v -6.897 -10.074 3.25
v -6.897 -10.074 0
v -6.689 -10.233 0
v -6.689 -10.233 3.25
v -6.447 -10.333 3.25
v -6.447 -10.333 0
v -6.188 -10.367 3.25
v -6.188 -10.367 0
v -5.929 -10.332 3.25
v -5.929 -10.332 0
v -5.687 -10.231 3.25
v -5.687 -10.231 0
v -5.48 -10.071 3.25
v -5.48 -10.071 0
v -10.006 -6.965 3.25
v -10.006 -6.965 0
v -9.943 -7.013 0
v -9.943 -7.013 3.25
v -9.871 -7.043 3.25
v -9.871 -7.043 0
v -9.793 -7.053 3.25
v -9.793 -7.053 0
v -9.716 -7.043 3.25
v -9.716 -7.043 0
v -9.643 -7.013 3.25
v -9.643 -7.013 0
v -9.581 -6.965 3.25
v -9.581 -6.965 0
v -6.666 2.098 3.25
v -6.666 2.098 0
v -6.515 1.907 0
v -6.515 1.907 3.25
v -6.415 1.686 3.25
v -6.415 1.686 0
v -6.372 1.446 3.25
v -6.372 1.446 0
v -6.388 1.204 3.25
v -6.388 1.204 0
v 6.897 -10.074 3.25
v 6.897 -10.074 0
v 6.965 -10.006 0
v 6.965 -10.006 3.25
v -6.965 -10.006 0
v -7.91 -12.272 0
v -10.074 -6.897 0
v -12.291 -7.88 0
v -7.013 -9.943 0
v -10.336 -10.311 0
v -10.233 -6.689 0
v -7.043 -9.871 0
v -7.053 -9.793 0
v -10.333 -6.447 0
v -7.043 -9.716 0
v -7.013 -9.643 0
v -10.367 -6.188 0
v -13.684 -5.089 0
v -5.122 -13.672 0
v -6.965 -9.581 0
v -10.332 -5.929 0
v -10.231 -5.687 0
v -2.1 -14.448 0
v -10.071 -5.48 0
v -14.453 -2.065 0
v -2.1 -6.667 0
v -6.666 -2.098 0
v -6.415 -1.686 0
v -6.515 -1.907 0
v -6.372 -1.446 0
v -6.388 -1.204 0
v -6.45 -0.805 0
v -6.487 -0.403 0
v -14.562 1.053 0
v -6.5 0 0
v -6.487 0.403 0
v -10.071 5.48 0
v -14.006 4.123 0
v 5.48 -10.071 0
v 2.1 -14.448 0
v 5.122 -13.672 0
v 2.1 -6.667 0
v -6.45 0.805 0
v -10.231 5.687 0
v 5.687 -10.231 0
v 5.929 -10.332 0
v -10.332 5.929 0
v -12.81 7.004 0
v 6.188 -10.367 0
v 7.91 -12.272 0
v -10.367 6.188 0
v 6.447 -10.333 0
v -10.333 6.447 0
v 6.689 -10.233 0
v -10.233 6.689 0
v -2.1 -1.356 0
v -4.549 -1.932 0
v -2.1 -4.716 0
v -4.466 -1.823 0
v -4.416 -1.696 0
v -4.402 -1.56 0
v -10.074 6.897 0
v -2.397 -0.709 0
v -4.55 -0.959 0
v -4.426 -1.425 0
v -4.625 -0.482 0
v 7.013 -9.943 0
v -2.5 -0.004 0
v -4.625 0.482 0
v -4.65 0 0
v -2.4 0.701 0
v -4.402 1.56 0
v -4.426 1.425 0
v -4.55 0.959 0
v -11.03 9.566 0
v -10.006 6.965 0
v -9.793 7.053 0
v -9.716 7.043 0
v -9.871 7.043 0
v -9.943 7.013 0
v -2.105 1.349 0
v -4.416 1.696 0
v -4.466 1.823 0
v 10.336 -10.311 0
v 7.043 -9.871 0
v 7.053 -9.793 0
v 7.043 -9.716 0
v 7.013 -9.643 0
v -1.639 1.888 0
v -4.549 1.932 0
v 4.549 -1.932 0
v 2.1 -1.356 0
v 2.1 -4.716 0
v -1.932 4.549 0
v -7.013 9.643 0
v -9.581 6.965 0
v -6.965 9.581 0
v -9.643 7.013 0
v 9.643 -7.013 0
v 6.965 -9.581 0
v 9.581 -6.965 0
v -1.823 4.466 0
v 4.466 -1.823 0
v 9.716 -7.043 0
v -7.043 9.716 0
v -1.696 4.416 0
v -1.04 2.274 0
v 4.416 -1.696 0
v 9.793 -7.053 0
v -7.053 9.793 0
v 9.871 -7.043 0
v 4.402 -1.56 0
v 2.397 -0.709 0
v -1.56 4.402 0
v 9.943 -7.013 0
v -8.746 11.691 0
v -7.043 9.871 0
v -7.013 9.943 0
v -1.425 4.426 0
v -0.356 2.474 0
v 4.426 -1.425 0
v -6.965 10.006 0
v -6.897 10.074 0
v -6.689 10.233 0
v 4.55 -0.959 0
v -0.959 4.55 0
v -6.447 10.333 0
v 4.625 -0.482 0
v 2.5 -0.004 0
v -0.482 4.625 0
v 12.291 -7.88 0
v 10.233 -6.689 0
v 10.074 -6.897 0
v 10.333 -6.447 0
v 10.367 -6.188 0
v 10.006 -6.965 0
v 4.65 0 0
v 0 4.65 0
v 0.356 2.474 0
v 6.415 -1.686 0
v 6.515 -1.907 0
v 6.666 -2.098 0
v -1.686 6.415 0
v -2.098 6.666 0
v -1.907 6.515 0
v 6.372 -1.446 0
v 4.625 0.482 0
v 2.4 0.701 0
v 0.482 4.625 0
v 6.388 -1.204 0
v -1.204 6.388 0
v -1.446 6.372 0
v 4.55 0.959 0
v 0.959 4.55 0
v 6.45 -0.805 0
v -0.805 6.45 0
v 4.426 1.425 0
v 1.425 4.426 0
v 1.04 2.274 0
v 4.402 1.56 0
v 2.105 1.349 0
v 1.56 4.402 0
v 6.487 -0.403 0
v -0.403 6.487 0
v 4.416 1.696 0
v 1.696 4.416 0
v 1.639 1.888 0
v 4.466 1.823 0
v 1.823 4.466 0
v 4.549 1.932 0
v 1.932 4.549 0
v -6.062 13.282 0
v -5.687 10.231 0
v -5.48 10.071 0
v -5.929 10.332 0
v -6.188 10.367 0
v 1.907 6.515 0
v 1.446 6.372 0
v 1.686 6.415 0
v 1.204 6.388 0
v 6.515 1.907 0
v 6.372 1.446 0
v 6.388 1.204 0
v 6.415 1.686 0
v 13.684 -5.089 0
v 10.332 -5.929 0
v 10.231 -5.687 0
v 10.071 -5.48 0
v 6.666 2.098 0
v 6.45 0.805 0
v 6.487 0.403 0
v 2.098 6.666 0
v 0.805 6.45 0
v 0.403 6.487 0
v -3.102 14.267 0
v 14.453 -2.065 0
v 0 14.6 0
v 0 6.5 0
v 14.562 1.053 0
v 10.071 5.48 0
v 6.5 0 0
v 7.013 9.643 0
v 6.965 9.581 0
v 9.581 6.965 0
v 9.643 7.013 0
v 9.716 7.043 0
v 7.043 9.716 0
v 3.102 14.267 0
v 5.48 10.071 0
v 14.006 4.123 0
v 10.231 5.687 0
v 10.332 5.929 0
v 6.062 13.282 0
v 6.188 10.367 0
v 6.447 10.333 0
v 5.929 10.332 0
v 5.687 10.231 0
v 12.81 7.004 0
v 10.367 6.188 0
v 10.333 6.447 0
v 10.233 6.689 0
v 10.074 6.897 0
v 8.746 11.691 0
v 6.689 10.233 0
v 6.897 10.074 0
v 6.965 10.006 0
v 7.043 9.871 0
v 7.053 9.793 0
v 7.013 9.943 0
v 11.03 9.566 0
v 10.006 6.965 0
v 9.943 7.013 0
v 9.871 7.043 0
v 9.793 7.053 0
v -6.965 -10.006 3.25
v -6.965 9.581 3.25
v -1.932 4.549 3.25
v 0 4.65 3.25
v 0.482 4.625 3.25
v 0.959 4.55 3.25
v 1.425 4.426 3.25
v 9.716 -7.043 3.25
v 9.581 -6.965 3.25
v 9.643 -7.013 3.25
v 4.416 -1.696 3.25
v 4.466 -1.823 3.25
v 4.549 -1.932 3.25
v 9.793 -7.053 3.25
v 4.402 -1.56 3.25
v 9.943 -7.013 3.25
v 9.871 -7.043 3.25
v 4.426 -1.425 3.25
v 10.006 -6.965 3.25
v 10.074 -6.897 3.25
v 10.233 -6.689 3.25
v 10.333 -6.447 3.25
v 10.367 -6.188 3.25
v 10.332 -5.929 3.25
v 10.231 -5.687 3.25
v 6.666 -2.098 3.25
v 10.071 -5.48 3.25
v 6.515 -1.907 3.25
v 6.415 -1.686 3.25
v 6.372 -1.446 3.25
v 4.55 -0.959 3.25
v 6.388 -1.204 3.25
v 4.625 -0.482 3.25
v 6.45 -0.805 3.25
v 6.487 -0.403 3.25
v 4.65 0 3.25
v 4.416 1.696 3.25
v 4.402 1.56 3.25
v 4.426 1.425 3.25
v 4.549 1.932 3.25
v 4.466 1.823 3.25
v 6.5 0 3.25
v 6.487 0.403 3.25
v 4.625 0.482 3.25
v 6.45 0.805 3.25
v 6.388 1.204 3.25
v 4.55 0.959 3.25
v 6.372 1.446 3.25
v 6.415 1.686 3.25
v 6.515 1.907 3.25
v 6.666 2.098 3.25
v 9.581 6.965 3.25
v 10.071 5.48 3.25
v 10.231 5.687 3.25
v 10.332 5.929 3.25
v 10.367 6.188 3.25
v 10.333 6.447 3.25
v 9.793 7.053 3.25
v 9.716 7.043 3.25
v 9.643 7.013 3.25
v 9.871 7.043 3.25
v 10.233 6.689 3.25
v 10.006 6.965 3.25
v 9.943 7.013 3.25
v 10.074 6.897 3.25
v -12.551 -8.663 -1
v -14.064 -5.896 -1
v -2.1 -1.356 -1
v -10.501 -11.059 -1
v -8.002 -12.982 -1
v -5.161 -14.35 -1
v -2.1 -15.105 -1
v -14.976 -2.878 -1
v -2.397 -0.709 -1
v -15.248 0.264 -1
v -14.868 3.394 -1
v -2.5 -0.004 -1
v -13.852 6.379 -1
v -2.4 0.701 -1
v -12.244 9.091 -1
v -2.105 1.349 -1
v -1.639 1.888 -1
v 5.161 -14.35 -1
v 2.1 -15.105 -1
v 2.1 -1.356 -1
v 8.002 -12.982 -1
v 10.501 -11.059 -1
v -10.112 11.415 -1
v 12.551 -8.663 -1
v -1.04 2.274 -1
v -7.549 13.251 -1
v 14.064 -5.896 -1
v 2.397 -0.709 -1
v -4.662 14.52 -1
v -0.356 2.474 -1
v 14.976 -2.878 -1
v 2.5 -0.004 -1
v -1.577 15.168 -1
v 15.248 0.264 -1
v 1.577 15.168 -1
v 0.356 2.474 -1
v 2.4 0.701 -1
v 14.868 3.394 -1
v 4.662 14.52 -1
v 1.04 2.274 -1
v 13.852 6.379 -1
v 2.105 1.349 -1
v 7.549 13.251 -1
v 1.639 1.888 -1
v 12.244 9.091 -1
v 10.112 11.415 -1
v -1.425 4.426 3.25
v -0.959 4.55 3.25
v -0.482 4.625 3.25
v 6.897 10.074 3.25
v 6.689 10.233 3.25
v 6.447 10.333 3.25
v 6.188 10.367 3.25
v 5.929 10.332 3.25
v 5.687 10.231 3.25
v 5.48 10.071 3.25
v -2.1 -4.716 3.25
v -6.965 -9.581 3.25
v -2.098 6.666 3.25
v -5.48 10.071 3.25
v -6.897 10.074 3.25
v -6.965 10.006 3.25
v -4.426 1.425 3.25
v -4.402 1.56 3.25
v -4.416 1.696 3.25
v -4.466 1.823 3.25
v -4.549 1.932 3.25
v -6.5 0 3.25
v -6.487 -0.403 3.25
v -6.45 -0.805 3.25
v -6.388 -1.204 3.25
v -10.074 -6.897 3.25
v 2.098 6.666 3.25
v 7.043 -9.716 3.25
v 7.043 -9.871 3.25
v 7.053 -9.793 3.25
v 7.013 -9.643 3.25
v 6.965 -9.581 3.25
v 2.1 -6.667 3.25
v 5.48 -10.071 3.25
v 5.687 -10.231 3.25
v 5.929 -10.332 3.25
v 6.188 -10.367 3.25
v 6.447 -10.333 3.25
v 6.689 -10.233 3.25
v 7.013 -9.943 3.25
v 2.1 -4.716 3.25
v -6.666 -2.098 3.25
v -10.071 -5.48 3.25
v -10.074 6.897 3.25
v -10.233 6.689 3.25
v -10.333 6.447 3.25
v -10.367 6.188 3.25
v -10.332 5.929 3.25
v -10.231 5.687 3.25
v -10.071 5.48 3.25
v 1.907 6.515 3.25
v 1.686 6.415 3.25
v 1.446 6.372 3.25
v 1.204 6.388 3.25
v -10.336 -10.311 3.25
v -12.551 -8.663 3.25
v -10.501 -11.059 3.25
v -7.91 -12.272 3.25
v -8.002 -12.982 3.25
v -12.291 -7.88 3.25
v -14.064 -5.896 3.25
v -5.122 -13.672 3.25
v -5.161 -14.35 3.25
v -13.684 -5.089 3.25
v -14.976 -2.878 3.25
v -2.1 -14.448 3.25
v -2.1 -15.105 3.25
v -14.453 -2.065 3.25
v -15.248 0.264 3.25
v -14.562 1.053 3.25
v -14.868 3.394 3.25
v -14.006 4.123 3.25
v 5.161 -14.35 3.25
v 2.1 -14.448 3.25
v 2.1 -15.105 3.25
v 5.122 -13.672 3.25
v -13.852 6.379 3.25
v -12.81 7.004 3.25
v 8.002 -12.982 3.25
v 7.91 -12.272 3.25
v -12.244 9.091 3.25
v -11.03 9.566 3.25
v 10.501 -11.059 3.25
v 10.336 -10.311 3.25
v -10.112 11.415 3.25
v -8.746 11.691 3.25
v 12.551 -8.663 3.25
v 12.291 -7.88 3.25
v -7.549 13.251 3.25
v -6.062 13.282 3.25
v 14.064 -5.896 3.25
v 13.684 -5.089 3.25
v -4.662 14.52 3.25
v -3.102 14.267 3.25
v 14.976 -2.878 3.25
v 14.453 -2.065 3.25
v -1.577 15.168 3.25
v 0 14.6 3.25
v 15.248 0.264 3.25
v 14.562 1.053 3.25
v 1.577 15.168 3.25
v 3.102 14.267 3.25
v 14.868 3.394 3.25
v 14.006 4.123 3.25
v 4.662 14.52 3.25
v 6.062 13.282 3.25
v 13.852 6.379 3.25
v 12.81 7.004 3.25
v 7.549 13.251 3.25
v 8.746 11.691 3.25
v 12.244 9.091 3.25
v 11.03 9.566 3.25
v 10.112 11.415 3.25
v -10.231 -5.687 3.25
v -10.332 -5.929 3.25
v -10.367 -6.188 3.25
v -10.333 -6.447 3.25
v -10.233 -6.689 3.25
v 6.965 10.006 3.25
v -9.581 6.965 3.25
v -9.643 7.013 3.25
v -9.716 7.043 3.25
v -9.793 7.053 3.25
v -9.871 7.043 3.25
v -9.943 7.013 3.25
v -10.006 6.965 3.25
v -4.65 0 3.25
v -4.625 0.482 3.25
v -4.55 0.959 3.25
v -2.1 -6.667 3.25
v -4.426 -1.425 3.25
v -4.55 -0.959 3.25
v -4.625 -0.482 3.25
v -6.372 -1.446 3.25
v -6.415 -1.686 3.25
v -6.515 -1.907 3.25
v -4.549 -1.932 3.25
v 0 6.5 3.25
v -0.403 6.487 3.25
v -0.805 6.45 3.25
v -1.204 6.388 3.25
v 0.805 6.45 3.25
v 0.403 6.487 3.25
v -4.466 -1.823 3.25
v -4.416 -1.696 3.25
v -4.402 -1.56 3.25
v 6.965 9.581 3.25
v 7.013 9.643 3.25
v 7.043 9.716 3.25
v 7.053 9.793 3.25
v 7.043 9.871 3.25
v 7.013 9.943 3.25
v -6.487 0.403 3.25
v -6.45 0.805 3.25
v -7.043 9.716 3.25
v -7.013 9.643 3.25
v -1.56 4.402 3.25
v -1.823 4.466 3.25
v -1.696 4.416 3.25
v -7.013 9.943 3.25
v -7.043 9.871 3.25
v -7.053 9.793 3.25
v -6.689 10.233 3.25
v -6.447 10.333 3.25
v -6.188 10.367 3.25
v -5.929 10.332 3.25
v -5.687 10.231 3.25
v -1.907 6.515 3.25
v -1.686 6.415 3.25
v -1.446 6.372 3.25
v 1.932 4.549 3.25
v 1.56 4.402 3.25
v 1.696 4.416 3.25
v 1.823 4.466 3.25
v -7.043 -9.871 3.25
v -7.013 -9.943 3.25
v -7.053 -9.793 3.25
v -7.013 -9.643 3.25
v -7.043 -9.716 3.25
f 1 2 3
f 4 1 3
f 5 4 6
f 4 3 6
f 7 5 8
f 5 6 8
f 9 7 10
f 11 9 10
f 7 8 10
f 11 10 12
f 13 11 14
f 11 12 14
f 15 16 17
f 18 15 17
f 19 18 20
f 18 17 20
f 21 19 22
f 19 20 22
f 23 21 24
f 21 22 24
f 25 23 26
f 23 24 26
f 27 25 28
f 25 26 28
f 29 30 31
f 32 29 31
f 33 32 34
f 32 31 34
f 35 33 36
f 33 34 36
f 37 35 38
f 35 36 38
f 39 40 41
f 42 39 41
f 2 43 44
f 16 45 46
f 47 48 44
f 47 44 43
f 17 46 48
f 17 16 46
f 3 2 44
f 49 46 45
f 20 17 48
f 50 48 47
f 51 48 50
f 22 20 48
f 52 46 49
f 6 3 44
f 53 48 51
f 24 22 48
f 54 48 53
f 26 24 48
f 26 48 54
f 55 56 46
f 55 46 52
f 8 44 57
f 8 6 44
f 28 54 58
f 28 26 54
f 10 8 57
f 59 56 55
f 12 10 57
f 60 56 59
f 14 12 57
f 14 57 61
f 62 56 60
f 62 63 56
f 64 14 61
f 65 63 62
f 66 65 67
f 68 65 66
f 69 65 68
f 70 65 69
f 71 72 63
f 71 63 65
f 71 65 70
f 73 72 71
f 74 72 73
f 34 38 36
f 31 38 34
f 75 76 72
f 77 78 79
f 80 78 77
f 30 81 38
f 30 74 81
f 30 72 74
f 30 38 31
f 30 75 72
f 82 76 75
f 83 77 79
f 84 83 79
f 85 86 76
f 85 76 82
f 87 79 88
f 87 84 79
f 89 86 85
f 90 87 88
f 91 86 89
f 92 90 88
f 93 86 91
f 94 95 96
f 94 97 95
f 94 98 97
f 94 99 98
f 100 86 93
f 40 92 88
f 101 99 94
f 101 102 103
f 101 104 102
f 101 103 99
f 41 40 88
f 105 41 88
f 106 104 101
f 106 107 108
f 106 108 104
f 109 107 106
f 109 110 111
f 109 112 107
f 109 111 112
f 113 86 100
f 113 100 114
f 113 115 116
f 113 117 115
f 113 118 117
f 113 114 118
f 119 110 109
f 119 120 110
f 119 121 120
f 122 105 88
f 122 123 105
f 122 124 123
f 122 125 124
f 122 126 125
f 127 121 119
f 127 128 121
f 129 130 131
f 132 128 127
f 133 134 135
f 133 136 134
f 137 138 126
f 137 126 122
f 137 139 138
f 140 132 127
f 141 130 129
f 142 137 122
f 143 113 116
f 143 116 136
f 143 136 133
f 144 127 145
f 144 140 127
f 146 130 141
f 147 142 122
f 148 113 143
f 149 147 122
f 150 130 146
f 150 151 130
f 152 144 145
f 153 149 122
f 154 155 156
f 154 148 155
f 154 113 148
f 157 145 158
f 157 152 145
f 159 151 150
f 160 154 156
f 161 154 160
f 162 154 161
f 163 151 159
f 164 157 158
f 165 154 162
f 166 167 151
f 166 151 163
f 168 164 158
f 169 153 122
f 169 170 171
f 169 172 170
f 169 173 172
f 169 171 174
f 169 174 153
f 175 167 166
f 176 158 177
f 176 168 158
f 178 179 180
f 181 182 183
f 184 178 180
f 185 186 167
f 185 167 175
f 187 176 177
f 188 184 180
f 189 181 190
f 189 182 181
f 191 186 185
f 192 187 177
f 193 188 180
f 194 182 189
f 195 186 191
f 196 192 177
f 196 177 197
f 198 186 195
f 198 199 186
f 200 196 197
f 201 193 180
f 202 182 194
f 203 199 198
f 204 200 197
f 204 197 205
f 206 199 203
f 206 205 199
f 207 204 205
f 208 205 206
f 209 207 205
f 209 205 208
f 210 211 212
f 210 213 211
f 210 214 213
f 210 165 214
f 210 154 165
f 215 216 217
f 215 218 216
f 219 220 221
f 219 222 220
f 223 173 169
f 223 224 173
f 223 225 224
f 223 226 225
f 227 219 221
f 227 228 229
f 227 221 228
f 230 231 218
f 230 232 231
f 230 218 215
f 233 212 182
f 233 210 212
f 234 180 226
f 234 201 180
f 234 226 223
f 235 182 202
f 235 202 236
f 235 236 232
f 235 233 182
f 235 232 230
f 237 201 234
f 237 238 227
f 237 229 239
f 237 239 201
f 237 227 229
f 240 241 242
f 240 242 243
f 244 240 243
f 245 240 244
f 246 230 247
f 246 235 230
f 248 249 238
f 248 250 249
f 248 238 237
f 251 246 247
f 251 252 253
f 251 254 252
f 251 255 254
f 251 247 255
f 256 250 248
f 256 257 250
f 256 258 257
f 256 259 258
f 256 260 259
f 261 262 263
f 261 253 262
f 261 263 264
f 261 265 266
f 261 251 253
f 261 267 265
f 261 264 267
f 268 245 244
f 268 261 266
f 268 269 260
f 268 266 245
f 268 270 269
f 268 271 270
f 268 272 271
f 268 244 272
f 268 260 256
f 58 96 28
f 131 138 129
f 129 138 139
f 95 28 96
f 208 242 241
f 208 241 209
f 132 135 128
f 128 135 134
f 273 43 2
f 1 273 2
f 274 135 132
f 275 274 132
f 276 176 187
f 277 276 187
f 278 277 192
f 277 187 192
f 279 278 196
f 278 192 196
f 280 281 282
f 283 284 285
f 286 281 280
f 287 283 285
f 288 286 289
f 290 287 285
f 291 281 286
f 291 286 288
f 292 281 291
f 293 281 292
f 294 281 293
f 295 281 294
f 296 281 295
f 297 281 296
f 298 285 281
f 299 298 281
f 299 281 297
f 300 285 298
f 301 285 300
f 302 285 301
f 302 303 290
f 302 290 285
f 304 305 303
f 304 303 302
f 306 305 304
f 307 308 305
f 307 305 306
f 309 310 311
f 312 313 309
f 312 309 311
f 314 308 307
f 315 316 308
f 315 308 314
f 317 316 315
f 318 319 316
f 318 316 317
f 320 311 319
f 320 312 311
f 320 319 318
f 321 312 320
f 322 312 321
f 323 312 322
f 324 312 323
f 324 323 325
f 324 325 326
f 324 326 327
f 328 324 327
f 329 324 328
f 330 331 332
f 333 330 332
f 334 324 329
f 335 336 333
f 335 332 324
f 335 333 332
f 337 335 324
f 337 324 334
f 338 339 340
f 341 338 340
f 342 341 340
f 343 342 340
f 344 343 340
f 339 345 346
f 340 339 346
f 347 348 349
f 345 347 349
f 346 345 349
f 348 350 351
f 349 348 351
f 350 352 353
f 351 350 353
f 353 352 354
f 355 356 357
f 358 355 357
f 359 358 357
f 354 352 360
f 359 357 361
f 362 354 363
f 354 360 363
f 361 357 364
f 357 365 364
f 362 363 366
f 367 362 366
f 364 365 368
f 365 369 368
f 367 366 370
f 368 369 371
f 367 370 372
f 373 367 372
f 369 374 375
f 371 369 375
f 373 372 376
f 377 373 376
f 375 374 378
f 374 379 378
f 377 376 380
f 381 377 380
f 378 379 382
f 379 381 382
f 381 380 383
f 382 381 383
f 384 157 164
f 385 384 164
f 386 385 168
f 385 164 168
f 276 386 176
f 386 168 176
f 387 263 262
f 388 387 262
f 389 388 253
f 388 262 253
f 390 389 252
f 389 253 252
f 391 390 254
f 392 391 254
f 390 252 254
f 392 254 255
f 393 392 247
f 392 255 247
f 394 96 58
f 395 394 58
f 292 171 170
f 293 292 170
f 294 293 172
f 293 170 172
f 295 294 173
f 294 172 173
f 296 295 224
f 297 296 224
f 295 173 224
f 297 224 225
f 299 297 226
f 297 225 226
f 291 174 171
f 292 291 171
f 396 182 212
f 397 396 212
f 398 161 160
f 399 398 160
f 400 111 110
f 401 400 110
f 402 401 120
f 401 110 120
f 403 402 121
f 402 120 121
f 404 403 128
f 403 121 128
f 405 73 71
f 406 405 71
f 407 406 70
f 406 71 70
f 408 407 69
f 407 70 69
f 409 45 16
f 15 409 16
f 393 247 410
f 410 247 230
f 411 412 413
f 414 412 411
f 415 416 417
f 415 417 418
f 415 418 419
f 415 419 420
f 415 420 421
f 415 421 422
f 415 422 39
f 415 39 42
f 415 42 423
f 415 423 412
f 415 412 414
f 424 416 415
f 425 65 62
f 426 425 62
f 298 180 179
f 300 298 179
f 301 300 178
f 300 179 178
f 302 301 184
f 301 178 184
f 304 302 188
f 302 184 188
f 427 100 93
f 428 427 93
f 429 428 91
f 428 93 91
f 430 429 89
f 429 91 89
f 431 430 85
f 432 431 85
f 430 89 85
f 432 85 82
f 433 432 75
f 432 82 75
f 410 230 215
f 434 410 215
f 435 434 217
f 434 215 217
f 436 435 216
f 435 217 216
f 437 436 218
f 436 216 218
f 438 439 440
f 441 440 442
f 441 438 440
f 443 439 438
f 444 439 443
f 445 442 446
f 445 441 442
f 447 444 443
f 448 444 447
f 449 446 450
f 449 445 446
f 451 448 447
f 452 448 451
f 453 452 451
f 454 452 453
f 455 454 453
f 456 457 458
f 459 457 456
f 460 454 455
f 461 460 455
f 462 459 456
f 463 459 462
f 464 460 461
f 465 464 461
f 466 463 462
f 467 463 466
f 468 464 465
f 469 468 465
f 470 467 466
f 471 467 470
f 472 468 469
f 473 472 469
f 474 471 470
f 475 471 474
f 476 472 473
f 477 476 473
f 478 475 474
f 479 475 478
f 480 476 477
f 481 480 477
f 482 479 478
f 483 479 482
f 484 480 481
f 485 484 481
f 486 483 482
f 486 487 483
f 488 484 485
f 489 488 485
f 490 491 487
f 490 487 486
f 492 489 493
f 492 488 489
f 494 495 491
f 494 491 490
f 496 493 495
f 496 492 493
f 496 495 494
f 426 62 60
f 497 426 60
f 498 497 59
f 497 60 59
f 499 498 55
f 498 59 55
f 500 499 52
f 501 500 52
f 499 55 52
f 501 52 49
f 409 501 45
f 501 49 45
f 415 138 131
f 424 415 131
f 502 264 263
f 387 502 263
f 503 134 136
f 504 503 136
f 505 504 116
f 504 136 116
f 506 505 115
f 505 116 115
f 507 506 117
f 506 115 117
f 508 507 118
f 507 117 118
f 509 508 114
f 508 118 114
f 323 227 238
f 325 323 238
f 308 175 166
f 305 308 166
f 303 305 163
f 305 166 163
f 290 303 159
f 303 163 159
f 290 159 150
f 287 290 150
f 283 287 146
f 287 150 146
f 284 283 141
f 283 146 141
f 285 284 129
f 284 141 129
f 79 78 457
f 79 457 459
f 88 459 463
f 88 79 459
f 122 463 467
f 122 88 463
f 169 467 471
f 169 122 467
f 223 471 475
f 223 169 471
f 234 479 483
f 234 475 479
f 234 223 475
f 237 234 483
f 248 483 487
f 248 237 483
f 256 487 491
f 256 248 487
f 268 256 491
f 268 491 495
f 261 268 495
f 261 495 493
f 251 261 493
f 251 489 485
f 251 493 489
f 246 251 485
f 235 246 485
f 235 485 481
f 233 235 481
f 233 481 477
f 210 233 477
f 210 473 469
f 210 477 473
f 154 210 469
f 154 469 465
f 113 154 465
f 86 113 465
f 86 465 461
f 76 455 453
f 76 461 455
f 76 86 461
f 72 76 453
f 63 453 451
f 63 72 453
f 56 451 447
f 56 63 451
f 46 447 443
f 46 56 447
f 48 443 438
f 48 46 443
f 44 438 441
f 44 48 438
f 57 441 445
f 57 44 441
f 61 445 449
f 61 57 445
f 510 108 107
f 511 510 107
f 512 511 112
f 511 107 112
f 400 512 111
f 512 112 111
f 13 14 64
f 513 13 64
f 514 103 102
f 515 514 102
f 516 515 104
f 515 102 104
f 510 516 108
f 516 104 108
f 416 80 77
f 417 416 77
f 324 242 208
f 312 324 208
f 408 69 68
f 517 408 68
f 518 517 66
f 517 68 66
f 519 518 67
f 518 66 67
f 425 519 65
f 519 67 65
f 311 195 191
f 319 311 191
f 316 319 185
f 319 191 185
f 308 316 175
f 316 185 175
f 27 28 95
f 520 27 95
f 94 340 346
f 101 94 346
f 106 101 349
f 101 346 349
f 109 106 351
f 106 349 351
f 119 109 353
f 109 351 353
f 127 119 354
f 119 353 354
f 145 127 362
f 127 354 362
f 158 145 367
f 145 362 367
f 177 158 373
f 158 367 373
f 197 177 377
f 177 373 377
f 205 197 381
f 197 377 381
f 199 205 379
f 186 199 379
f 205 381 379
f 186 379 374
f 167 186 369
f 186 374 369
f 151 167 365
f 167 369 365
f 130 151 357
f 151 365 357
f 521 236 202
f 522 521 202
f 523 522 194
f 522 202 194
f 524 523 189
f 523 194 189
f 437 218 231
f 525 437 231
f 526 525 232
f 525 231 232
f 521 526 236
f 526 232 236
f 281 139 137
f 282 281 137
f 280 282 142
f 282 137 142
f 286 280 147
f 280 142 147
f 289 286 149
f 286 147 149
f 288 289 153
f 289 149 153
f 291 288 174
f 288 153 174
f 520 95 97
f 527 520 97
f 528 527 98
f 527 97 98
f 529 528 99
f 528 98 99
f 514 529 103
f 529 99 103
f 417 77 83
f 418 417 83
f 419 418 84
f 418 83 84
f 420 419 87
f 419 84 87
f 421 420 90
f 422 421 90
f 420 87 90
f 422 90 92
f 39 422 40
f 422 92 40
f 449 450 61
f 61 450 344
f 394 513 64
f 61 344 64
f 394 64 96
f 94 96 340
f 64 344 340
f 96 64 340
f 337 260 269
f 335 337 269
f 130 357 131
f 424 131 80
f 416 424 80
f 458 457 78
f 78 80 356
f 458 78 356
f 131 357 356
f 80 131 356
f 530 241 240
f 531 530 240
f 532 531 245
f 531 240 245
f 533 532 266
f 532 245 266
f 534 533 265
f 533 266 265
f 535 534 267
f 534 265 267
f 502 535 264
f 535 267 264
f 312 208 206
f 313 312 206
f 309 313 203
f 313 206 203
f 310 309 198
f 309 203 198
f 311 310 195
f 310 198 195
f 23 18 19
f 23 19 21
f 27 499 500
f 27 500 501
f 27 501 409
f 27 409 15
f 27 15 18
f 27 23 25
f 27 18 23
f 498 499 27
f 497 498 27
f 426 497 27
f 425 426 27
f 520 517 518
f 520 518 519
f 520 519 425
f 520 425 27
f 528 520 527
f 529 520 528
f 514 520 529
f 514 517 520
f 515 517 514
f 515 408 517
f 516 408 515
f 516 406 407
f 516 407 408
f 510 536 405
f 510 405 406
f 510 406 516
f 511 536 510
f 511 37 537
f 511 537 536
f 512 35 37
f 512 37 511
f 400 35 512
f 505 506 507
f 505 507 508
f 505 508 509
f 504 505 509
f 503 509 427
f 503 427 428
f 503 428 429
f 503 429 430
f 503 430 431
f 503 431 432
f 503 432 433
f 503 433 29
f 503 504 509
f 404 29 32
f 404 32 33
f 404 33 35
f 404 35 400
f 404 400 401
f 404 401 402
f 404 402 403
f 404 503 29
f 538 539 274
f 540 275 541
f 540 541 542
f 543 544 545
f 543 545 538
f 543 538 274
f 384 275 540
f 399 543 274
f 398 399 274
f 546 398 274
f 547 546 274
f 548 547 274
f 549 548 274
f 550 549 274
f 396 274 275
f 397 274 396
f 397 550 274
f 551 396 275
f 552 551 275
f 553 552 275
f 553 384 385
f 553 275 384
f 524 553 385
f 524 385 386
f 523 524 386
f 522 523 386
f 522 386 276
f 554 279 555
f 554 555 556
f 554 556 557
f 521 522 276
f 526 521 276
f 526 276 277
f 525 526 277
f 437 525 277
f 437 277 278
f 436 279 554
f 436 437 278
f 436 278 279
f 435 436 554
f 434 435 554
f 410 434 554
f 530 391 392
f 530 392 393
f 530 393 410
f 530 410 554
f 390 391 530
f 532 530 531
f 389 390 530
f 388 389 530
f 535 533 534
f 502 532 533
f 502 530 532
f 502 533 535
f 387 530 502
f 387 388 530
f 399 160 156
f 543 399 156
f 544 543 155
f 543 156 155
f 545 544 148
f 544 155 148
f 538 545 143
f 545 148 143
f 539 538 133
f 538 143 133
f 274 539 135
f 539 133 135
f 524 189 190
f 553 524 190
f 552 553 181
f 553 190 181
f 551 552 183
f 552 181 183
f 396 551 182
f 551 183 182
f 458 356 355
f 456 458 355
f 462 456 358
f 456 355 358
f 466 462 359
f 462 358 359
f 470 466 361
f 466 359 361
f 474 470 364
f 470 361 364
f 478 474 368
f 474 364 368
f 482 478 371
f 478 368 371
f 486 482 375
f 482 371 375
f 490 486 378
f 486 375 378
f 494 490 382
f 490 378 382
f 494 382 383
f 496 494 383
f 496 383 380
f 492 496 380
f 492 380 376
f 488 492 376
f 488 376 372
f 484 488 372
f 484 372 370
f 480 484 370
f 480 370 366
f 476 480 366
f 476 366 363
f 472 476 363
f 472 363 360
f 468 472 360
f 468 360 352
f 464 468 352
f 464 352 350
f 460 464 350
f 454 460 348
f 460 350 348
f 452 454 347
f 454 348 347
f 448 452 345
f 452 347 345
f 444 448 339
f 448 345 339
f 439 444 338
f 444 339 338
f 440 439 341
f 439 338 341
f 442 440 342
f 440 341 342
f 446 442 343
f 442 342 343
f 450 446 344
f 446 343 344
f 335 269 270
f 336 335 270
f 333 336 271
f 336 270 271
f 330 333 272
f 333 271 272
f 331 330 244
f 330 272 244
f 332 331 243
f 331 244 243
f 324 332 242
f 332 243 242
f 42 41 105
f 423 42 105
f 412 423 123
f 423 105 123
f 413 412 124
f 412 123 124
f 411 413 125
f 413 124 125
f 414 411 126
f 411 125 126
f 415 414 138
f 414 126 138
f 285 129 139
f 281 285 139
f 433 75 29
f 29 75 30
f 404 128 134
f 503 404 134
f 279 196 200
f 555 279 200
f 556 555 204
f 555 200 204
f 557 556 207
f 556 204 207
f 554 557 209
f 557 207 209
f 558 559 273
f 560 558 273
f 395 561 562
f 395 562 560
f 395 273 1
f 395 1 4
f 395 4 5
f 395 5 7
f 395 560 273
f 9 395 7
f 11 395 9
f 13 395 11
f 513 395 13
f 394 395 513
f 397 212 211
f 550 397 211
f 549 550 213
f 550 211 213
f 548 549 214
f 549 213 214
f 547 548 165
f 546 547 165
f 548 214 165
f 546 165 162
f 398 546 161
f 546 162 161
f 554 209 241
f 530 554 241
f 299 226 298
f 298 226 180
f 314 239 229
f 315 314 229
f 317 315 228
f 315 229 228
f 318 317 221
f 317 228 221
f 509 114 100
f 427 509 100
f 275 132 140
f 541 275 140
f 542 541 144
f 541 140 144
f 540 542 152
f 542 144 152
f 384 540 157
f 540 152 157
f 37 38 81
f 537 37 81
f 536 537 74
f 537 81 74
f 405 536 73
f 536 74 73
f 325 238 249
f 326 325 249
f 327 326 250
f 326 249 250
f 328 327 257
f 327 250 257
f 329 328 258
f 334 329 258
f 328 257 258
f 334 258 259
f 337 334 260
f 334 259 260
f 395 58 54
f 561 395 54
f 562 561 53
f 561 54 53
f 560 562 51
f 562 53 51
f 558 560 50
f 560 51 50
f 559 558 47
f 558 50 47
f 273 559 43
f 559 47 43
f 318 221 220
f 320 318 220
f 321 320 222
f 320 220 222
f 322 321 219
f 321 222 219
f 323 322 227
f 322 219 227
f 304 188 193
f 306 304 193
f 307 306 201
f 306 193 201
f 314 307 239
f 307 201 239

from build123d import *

# Parameters (mm, degrees)
F0_R     = 15.25
F1_DEPTH = 1
F2_R     = 15.25
F2_R_2   = 14.6
F3_DEPTH = 3.25
F5_DEPTH = 4.251


with BuildPart() as f1:
    # F0 (on Top) → F1 (new body)
    with BuildSketch(Plane.XY):
        Circle(F0_R)
    extrude(amount=-F1_DEPTH)

    # F2 (on Top) → F3 (join)
    with BuildSketch(Plane.XY):
        Circle(F2_R)
        Circle(F2_R_2, mode=Mode.SUBTRACT)
        with BuildLine():
            ThreePointArc((1.4254005383, 4.426142034), (1.6960254298, 4.4160388114), (1.932222804, 4.5485178944))
            Line((1.932222804, 4.5485178944), (6.9650017947, 9.5812968851))
            ThreePointArc((6.9650017947, 9.5812968851), (7.0528697603, 9.7934289194), (6.9650017947, 10.0055609538))
            Line((6.9650017947, 10.0055609538), (6.8967918056, 10.0737709429))
            ThreePointArc((6.8967918056, 10.0737709429), (6.1879198942, 10.3666626039), (5.4800863823, 10.0712702695))
            Line((5.4800863823, 10.0712702695), (2.0984543523, 6.6656774564))
            ThreePointArc((2.0984543523, 6.6656774564), (1.6856522801, 6.4153428351), (1.2036749488, 6.3875790889))
            ThreePointArc((1.2036749488, 6.3875790889), (0.6044567486, 6.4718337462), (0, 6.5))
            ThreePointArc((0, 6.5), (-0.6044567486, 6.4718337462), (-1.2036749488, 6.3875790889))
            ThreePointArc((-1.2036749488, 6.3875790889), (-1.6856522801, 6.4153428351), (-2.0984543523, 6.6656774564))
            Line((-2.0984543523, 6.6656774564), (-5.4800863823, 10.0712702695))
            ThreePointArc((-5.4800863823, 10.0712702695), (-6.1879198942, 10.3666626039), (-6.8967918056, 10.0737709429))
            Line((-6.8967918056, 10.0737709429), (-6.9650017947, 10.0055609538))
            ThreePointArc((-6.9650017947, 10.0055609538), (-7.0528697603, 9.7934289194), (-6.9650017947, 9.5812968851))
            Line((-6.9650017947, 9.5812968851), (-1.932222804, 4.5485178944))
            ThreePointArc((-1.932222804, 4.5485178944), (-1.6960254298, 4.4160388114), (-1.4254005383, 4.426142034))
            ThreePointArc((-1.4254005383, 4.426142034), (-0.7214359091, 4.5936946164), (0, 4.65))
            ThreePointArc((0, 4.65), (0.7214359091, 4.5936946164), (1.4254005383, 4.426142034))
        make_face()
        with BuildLine():
            Line((10.0737709429, 6.8967918056), (10.0055609538, 6.9650017947))
            ThreePointArc((10.0055609538, 6.9650017947), (9.7934289194, 7.0528697603), (9.5812968851, 6.9650017947))
            Line((9.5812968851, 6.9650017947), (4.5485178944, 1.932222804))
            ThreePointArc((4.5485178944, 1.932222804), (4.4160388114, 1.6960254298), (4.426142034, 1.4254005383))
            ThreePointArc((4.426142034, 1.4254005383), (4.5936946164, 0.7214359091), (4.65, 0))
            ThreePointArc((4.65, 0), (4.5936946164, -0.7214359091), (4.426142034, -1.4254005383))
            ThreePointArc((4.426142034, -1.4254005383), (4.4160388114, -1.6960254298), (4.5485178944, -1.932222804))
            Line((4.5485178944, -1.932222804), (9.5812968851, -6.9650017947))
            ThreePointArc((9.5812968851, -6.9650017947), (9.7934289194, -7.0528697603), (10.0055609538, -6.9650017947))
            Line((10.0055609538, -6.9650017947), (10.0737709429, -6.8967918056))
            ThreePointArc((10.0737709429, -6.8967918056), (10.3666626039, -6.1879198942), (10.0712702695, -5.4800863823))
            Line((10.0712702695, -5.4800863823), (6.6656774564, -2.0984543523))
            ThreePointArc((6.6656774564, -2.0984543523), (6.4153428351, -1.6856522801), (6.3875790889, -1.2036749488))
            ThreePointArc((6.3875790889, -1.2036749488), (6.4718337462, -0.6044567486), (6.5, 0))
            ThreePointArc((6.5, 0), (6.4718337462, 0.6044567486), (6.3875790889, 1.2036749488))
            ThreePointArc((6.3875790889, 1.2036749488), (6.4153428351, 1.6856522801), (6.6656774564, 2.0984543523))
            Line((6.6656774564, 2.0984543523), (10.0712702695, 5.4800863823))
            ThreePointArc((10.0712702695, 5.4800863823), (10.3666626039, 6.1879198942), (10.0737709429, 6.8967918056))
        make_face()
        with BuildLine():
            ThreePointArc((-9.5812968851, 6.9650017947), (-9.7934289194, 7.0528697603), (-10.0055609538, 6.9650017947))
            Line((-10.0055609538, 6.9650017947), (-10.0737709429, 6.8967918056))
            ThreePointArc((-10.0737709429, 6.8967918056), (-10.3666626039, 6.1879198942), (-10.0712702695, 5.4800863823))
            Line((-10.0712702695, 5.4800863823), (-6.6656774564, 2.0984543523))
            ThreePointArc((-6.6656774564, 2.0984543523), (-6.4153428351, 1.6856522801), (-6.3875790889, 1.2036749488))
            ThreePointArc((-6.3875790889, 1.2036749488), (-6.4718337462, 0.6044567486), (-6.5, 0))
            ThreePointArc((-6.5, 0), (-6.4718337462, -0.6044567486), (-6.3875790889, -1.2036749488))
            ThreePointArc((-6.3875790889, -1.2036749488), (-6.4153428351, -1.6856522801), (-6.6656774564, -2.0984543523))
            Line((-6.6656774564, -2.0984543523), (-10.0712702695, -5.4800863823))
            ThreePointArc((-10.0712702695, -5.4800863823), (-10.3666626039, -6.1879198942), (-10.0737709429, -6.8967918056))
            Line((-10.0737709429, -6.8967918056), (-10.0055609538, -6.9650017947))
            ThreePointArc((-10.0055609538, -6.9650017947), (-9.7934289194, -7.0528697603), (-9.5812968851, -6.9650017947))
            Line((-9.5812968851, -6.9650017947), (-4.5485178944, -1.932222804))
            ThreePointArc((-4.5485178944, -1.932222804), (-4.4160388114, -1.6960254298), (-4.426142034, -1.4254005383))
            ThreePointArc((-4.426142034, -1.4254005383), (-4.5936946164, -0.7214359091), (-4.65, 0))
            ThreePointArc((-4.65, 0), (-4.5936946164, 0.7214359091), (-4.426142034, 1.4254005383))
            ThreePointArc((-4.426142034, 1.4254005383), (-4.4160388114, 1.6960254298), (-4.5485178944, 1.932222804))
            Line((-4.5485178944, 1.932222804), (-9.5812968851, 6.9650017947))
        make_face()
        with BuildLine():
            ThreePointArc((-6.9650017947, -9.5812968851), (-7.0528697603, -9.7934289194), (-6.9650017947, -10.0055609538))
            Line((-6.9650017947, -10.0055609538), (-6.8967918056, -10.0737709429))
            ThreePointArc((-6.8967918056, -10.0737709429), (-6.1879198942, -10.3666626039), (-5.4800863823, -10.0712702695))
            Line((-5.4800863823, -10.0712702695), (-2.0984543523, -6.6656774564))
            ThreePointArc((-2.0984543523, -6.6656774564), (-1.6856522801, -6.4153428351), (-1.2036749488, -6.3875790889))
            ThreePointArc((-1.2036749488, -6.3875790889), (-0.6044567486, -6.4718337462), (0, -6.5))
            ThreePointArc((0, -6.5), (0.6044567486, -6.4718337462), (1.2036749488, -6.3875790889))
            ThreePointArc((1.2036749488, -6.3875790889), (1.6856522801, -6.4153428351), (2.0984543523, -6.6656774564))
            Line((2.0984543523, -6.6656774564), (5.4800863823, -10.0712702695))
            ThreePointArc((5.4800863823, -10.0712702695), (6.1879198942, -10.3666626039), (6.8967918056, -10.0737709429))
            Line((6.8967918056, -10.0737709429), (6.9650017947, -10.0055609538))
            ThreePointArc((6.9650017947, -10.0055609538), (7.0528697603, -9.7934289194), (6.9650017947, -9.5812968851))
            Line((6.9650017947, -9.5812968851), (1.932222804, -4.5485178944))
            ThreePointArc((1.932222804, -4.5485178944), (1.6960254298, -4.4160388114), (1.4254005383, -4.426142034))
            ThreePointArc((1.4254005383, -4.426142034), (0.7214359091, -4.5936946164), (0, -4.65))
            ThreePointArc((0, -4.65), (-0.7214359091, -4.5936946164), (-1.4254005383, -4.426142034))
            ThreePointArc((-1.4254005383, -4.426142034), (-1.6960254298, -4.4160388114), (-1.932222804, -4.5485178944))
            Line((-1.932222804, -4.5485178944), (-6.9650017947, -9.5812968851))
        make_face()
    extrude(amount=F3_DEPTH)

    # F4 (on face) → F5 (cut, through all)
    with BuildSketch(Plane(origin=(0, 0, -1), x_dir=(1, 0, 0), z_dir=(0, 0, -1))):
        with BuildLine():
            Line((-2.1, 16), (-2.1, 1.3564659966))
            ThreePointArc((-2.1, 1.3564659966), (0, -2.5), (2.1, 1.3564659966))
            Line((2.1, 1.3564659966), (2.1, 16))
            Line((2.1, 16), (0, 16))
            Line((0, 16), (-2.1, 16))
        make_face()
    extrude(amount=-F5_DEPTH, mode=Mode.SUBTRACT)


solid = f1.part
